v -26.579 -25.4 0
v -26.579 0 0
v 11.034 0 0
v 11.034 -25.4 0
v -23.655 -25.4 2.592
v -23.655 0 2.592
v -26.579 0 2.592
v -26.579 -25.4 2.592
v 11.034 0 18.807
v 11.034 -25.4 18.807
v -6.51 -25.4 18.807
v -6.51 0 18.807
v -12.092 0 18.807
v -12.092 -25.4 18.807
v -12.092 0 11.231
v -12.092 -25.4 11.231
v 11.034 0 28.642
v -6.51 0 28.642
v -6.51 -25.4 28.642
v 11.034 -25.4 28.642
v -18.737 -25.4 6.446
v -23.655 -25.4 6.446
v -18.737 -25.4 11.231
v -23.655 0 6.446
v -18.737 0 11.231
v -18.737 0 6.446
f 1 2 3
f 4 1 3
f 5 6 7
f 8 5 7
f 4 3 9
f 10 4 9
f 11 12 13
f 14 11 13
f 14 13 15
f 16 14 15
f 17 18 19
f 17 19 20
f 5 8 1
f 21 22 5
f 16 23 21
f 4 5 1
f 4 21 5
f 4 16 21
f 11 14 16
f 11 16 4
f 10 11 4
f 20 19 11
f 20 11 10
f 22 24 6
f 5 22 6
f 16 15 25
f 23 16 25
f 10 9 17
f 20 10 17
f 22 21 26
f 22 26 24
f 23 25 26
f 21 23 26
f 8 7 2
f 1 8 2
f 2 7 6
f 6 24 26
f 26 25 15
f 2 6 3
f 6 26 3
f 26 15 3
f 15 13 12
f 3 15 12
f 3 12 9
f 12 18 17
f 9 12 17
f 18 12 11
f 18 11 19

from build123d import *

# Parameters (mm, degrees)
F0_W     = 17.543719
F0_H     = 9.835118
F1_DEPTH = 25.4


with BuildPart() as f1:
    # F0 (on Front) → F1 (new body)
    with BuildSketch(Plane.XZ):
        Polygon((-26.578831, 2.592185), (-26.578831, 0), (11.033846, 0), (11.033846, 2.592185), (-23.654874, 2.592185), align=None)
        Polygon((-23.654874, 6.446487), (-23.654874, 2.592185), (11.033846, 2.592185), (11.033846, 6.446487), (-18.737316, 6.446487), align=None)
        Polygon((-18.737316, 6.446487), (11.033846, 6.446487), (11.033846, 11.231139), (-12.091967, 11.231139), (-18.737316, 11.231139), align=None)
        Polygon((-12.091967, 11.231139), (11.033846, 11.231139), (11.033846, 18.806836), (-6.509873, 18.806836), (-12.091967, 18.806836), align=None)
        with Locations((2.261986, 23.724395)):
            Rectangle(F0_W, F0_H)
    extrude(amount=F1_DEPTH)


solid = f1.part
